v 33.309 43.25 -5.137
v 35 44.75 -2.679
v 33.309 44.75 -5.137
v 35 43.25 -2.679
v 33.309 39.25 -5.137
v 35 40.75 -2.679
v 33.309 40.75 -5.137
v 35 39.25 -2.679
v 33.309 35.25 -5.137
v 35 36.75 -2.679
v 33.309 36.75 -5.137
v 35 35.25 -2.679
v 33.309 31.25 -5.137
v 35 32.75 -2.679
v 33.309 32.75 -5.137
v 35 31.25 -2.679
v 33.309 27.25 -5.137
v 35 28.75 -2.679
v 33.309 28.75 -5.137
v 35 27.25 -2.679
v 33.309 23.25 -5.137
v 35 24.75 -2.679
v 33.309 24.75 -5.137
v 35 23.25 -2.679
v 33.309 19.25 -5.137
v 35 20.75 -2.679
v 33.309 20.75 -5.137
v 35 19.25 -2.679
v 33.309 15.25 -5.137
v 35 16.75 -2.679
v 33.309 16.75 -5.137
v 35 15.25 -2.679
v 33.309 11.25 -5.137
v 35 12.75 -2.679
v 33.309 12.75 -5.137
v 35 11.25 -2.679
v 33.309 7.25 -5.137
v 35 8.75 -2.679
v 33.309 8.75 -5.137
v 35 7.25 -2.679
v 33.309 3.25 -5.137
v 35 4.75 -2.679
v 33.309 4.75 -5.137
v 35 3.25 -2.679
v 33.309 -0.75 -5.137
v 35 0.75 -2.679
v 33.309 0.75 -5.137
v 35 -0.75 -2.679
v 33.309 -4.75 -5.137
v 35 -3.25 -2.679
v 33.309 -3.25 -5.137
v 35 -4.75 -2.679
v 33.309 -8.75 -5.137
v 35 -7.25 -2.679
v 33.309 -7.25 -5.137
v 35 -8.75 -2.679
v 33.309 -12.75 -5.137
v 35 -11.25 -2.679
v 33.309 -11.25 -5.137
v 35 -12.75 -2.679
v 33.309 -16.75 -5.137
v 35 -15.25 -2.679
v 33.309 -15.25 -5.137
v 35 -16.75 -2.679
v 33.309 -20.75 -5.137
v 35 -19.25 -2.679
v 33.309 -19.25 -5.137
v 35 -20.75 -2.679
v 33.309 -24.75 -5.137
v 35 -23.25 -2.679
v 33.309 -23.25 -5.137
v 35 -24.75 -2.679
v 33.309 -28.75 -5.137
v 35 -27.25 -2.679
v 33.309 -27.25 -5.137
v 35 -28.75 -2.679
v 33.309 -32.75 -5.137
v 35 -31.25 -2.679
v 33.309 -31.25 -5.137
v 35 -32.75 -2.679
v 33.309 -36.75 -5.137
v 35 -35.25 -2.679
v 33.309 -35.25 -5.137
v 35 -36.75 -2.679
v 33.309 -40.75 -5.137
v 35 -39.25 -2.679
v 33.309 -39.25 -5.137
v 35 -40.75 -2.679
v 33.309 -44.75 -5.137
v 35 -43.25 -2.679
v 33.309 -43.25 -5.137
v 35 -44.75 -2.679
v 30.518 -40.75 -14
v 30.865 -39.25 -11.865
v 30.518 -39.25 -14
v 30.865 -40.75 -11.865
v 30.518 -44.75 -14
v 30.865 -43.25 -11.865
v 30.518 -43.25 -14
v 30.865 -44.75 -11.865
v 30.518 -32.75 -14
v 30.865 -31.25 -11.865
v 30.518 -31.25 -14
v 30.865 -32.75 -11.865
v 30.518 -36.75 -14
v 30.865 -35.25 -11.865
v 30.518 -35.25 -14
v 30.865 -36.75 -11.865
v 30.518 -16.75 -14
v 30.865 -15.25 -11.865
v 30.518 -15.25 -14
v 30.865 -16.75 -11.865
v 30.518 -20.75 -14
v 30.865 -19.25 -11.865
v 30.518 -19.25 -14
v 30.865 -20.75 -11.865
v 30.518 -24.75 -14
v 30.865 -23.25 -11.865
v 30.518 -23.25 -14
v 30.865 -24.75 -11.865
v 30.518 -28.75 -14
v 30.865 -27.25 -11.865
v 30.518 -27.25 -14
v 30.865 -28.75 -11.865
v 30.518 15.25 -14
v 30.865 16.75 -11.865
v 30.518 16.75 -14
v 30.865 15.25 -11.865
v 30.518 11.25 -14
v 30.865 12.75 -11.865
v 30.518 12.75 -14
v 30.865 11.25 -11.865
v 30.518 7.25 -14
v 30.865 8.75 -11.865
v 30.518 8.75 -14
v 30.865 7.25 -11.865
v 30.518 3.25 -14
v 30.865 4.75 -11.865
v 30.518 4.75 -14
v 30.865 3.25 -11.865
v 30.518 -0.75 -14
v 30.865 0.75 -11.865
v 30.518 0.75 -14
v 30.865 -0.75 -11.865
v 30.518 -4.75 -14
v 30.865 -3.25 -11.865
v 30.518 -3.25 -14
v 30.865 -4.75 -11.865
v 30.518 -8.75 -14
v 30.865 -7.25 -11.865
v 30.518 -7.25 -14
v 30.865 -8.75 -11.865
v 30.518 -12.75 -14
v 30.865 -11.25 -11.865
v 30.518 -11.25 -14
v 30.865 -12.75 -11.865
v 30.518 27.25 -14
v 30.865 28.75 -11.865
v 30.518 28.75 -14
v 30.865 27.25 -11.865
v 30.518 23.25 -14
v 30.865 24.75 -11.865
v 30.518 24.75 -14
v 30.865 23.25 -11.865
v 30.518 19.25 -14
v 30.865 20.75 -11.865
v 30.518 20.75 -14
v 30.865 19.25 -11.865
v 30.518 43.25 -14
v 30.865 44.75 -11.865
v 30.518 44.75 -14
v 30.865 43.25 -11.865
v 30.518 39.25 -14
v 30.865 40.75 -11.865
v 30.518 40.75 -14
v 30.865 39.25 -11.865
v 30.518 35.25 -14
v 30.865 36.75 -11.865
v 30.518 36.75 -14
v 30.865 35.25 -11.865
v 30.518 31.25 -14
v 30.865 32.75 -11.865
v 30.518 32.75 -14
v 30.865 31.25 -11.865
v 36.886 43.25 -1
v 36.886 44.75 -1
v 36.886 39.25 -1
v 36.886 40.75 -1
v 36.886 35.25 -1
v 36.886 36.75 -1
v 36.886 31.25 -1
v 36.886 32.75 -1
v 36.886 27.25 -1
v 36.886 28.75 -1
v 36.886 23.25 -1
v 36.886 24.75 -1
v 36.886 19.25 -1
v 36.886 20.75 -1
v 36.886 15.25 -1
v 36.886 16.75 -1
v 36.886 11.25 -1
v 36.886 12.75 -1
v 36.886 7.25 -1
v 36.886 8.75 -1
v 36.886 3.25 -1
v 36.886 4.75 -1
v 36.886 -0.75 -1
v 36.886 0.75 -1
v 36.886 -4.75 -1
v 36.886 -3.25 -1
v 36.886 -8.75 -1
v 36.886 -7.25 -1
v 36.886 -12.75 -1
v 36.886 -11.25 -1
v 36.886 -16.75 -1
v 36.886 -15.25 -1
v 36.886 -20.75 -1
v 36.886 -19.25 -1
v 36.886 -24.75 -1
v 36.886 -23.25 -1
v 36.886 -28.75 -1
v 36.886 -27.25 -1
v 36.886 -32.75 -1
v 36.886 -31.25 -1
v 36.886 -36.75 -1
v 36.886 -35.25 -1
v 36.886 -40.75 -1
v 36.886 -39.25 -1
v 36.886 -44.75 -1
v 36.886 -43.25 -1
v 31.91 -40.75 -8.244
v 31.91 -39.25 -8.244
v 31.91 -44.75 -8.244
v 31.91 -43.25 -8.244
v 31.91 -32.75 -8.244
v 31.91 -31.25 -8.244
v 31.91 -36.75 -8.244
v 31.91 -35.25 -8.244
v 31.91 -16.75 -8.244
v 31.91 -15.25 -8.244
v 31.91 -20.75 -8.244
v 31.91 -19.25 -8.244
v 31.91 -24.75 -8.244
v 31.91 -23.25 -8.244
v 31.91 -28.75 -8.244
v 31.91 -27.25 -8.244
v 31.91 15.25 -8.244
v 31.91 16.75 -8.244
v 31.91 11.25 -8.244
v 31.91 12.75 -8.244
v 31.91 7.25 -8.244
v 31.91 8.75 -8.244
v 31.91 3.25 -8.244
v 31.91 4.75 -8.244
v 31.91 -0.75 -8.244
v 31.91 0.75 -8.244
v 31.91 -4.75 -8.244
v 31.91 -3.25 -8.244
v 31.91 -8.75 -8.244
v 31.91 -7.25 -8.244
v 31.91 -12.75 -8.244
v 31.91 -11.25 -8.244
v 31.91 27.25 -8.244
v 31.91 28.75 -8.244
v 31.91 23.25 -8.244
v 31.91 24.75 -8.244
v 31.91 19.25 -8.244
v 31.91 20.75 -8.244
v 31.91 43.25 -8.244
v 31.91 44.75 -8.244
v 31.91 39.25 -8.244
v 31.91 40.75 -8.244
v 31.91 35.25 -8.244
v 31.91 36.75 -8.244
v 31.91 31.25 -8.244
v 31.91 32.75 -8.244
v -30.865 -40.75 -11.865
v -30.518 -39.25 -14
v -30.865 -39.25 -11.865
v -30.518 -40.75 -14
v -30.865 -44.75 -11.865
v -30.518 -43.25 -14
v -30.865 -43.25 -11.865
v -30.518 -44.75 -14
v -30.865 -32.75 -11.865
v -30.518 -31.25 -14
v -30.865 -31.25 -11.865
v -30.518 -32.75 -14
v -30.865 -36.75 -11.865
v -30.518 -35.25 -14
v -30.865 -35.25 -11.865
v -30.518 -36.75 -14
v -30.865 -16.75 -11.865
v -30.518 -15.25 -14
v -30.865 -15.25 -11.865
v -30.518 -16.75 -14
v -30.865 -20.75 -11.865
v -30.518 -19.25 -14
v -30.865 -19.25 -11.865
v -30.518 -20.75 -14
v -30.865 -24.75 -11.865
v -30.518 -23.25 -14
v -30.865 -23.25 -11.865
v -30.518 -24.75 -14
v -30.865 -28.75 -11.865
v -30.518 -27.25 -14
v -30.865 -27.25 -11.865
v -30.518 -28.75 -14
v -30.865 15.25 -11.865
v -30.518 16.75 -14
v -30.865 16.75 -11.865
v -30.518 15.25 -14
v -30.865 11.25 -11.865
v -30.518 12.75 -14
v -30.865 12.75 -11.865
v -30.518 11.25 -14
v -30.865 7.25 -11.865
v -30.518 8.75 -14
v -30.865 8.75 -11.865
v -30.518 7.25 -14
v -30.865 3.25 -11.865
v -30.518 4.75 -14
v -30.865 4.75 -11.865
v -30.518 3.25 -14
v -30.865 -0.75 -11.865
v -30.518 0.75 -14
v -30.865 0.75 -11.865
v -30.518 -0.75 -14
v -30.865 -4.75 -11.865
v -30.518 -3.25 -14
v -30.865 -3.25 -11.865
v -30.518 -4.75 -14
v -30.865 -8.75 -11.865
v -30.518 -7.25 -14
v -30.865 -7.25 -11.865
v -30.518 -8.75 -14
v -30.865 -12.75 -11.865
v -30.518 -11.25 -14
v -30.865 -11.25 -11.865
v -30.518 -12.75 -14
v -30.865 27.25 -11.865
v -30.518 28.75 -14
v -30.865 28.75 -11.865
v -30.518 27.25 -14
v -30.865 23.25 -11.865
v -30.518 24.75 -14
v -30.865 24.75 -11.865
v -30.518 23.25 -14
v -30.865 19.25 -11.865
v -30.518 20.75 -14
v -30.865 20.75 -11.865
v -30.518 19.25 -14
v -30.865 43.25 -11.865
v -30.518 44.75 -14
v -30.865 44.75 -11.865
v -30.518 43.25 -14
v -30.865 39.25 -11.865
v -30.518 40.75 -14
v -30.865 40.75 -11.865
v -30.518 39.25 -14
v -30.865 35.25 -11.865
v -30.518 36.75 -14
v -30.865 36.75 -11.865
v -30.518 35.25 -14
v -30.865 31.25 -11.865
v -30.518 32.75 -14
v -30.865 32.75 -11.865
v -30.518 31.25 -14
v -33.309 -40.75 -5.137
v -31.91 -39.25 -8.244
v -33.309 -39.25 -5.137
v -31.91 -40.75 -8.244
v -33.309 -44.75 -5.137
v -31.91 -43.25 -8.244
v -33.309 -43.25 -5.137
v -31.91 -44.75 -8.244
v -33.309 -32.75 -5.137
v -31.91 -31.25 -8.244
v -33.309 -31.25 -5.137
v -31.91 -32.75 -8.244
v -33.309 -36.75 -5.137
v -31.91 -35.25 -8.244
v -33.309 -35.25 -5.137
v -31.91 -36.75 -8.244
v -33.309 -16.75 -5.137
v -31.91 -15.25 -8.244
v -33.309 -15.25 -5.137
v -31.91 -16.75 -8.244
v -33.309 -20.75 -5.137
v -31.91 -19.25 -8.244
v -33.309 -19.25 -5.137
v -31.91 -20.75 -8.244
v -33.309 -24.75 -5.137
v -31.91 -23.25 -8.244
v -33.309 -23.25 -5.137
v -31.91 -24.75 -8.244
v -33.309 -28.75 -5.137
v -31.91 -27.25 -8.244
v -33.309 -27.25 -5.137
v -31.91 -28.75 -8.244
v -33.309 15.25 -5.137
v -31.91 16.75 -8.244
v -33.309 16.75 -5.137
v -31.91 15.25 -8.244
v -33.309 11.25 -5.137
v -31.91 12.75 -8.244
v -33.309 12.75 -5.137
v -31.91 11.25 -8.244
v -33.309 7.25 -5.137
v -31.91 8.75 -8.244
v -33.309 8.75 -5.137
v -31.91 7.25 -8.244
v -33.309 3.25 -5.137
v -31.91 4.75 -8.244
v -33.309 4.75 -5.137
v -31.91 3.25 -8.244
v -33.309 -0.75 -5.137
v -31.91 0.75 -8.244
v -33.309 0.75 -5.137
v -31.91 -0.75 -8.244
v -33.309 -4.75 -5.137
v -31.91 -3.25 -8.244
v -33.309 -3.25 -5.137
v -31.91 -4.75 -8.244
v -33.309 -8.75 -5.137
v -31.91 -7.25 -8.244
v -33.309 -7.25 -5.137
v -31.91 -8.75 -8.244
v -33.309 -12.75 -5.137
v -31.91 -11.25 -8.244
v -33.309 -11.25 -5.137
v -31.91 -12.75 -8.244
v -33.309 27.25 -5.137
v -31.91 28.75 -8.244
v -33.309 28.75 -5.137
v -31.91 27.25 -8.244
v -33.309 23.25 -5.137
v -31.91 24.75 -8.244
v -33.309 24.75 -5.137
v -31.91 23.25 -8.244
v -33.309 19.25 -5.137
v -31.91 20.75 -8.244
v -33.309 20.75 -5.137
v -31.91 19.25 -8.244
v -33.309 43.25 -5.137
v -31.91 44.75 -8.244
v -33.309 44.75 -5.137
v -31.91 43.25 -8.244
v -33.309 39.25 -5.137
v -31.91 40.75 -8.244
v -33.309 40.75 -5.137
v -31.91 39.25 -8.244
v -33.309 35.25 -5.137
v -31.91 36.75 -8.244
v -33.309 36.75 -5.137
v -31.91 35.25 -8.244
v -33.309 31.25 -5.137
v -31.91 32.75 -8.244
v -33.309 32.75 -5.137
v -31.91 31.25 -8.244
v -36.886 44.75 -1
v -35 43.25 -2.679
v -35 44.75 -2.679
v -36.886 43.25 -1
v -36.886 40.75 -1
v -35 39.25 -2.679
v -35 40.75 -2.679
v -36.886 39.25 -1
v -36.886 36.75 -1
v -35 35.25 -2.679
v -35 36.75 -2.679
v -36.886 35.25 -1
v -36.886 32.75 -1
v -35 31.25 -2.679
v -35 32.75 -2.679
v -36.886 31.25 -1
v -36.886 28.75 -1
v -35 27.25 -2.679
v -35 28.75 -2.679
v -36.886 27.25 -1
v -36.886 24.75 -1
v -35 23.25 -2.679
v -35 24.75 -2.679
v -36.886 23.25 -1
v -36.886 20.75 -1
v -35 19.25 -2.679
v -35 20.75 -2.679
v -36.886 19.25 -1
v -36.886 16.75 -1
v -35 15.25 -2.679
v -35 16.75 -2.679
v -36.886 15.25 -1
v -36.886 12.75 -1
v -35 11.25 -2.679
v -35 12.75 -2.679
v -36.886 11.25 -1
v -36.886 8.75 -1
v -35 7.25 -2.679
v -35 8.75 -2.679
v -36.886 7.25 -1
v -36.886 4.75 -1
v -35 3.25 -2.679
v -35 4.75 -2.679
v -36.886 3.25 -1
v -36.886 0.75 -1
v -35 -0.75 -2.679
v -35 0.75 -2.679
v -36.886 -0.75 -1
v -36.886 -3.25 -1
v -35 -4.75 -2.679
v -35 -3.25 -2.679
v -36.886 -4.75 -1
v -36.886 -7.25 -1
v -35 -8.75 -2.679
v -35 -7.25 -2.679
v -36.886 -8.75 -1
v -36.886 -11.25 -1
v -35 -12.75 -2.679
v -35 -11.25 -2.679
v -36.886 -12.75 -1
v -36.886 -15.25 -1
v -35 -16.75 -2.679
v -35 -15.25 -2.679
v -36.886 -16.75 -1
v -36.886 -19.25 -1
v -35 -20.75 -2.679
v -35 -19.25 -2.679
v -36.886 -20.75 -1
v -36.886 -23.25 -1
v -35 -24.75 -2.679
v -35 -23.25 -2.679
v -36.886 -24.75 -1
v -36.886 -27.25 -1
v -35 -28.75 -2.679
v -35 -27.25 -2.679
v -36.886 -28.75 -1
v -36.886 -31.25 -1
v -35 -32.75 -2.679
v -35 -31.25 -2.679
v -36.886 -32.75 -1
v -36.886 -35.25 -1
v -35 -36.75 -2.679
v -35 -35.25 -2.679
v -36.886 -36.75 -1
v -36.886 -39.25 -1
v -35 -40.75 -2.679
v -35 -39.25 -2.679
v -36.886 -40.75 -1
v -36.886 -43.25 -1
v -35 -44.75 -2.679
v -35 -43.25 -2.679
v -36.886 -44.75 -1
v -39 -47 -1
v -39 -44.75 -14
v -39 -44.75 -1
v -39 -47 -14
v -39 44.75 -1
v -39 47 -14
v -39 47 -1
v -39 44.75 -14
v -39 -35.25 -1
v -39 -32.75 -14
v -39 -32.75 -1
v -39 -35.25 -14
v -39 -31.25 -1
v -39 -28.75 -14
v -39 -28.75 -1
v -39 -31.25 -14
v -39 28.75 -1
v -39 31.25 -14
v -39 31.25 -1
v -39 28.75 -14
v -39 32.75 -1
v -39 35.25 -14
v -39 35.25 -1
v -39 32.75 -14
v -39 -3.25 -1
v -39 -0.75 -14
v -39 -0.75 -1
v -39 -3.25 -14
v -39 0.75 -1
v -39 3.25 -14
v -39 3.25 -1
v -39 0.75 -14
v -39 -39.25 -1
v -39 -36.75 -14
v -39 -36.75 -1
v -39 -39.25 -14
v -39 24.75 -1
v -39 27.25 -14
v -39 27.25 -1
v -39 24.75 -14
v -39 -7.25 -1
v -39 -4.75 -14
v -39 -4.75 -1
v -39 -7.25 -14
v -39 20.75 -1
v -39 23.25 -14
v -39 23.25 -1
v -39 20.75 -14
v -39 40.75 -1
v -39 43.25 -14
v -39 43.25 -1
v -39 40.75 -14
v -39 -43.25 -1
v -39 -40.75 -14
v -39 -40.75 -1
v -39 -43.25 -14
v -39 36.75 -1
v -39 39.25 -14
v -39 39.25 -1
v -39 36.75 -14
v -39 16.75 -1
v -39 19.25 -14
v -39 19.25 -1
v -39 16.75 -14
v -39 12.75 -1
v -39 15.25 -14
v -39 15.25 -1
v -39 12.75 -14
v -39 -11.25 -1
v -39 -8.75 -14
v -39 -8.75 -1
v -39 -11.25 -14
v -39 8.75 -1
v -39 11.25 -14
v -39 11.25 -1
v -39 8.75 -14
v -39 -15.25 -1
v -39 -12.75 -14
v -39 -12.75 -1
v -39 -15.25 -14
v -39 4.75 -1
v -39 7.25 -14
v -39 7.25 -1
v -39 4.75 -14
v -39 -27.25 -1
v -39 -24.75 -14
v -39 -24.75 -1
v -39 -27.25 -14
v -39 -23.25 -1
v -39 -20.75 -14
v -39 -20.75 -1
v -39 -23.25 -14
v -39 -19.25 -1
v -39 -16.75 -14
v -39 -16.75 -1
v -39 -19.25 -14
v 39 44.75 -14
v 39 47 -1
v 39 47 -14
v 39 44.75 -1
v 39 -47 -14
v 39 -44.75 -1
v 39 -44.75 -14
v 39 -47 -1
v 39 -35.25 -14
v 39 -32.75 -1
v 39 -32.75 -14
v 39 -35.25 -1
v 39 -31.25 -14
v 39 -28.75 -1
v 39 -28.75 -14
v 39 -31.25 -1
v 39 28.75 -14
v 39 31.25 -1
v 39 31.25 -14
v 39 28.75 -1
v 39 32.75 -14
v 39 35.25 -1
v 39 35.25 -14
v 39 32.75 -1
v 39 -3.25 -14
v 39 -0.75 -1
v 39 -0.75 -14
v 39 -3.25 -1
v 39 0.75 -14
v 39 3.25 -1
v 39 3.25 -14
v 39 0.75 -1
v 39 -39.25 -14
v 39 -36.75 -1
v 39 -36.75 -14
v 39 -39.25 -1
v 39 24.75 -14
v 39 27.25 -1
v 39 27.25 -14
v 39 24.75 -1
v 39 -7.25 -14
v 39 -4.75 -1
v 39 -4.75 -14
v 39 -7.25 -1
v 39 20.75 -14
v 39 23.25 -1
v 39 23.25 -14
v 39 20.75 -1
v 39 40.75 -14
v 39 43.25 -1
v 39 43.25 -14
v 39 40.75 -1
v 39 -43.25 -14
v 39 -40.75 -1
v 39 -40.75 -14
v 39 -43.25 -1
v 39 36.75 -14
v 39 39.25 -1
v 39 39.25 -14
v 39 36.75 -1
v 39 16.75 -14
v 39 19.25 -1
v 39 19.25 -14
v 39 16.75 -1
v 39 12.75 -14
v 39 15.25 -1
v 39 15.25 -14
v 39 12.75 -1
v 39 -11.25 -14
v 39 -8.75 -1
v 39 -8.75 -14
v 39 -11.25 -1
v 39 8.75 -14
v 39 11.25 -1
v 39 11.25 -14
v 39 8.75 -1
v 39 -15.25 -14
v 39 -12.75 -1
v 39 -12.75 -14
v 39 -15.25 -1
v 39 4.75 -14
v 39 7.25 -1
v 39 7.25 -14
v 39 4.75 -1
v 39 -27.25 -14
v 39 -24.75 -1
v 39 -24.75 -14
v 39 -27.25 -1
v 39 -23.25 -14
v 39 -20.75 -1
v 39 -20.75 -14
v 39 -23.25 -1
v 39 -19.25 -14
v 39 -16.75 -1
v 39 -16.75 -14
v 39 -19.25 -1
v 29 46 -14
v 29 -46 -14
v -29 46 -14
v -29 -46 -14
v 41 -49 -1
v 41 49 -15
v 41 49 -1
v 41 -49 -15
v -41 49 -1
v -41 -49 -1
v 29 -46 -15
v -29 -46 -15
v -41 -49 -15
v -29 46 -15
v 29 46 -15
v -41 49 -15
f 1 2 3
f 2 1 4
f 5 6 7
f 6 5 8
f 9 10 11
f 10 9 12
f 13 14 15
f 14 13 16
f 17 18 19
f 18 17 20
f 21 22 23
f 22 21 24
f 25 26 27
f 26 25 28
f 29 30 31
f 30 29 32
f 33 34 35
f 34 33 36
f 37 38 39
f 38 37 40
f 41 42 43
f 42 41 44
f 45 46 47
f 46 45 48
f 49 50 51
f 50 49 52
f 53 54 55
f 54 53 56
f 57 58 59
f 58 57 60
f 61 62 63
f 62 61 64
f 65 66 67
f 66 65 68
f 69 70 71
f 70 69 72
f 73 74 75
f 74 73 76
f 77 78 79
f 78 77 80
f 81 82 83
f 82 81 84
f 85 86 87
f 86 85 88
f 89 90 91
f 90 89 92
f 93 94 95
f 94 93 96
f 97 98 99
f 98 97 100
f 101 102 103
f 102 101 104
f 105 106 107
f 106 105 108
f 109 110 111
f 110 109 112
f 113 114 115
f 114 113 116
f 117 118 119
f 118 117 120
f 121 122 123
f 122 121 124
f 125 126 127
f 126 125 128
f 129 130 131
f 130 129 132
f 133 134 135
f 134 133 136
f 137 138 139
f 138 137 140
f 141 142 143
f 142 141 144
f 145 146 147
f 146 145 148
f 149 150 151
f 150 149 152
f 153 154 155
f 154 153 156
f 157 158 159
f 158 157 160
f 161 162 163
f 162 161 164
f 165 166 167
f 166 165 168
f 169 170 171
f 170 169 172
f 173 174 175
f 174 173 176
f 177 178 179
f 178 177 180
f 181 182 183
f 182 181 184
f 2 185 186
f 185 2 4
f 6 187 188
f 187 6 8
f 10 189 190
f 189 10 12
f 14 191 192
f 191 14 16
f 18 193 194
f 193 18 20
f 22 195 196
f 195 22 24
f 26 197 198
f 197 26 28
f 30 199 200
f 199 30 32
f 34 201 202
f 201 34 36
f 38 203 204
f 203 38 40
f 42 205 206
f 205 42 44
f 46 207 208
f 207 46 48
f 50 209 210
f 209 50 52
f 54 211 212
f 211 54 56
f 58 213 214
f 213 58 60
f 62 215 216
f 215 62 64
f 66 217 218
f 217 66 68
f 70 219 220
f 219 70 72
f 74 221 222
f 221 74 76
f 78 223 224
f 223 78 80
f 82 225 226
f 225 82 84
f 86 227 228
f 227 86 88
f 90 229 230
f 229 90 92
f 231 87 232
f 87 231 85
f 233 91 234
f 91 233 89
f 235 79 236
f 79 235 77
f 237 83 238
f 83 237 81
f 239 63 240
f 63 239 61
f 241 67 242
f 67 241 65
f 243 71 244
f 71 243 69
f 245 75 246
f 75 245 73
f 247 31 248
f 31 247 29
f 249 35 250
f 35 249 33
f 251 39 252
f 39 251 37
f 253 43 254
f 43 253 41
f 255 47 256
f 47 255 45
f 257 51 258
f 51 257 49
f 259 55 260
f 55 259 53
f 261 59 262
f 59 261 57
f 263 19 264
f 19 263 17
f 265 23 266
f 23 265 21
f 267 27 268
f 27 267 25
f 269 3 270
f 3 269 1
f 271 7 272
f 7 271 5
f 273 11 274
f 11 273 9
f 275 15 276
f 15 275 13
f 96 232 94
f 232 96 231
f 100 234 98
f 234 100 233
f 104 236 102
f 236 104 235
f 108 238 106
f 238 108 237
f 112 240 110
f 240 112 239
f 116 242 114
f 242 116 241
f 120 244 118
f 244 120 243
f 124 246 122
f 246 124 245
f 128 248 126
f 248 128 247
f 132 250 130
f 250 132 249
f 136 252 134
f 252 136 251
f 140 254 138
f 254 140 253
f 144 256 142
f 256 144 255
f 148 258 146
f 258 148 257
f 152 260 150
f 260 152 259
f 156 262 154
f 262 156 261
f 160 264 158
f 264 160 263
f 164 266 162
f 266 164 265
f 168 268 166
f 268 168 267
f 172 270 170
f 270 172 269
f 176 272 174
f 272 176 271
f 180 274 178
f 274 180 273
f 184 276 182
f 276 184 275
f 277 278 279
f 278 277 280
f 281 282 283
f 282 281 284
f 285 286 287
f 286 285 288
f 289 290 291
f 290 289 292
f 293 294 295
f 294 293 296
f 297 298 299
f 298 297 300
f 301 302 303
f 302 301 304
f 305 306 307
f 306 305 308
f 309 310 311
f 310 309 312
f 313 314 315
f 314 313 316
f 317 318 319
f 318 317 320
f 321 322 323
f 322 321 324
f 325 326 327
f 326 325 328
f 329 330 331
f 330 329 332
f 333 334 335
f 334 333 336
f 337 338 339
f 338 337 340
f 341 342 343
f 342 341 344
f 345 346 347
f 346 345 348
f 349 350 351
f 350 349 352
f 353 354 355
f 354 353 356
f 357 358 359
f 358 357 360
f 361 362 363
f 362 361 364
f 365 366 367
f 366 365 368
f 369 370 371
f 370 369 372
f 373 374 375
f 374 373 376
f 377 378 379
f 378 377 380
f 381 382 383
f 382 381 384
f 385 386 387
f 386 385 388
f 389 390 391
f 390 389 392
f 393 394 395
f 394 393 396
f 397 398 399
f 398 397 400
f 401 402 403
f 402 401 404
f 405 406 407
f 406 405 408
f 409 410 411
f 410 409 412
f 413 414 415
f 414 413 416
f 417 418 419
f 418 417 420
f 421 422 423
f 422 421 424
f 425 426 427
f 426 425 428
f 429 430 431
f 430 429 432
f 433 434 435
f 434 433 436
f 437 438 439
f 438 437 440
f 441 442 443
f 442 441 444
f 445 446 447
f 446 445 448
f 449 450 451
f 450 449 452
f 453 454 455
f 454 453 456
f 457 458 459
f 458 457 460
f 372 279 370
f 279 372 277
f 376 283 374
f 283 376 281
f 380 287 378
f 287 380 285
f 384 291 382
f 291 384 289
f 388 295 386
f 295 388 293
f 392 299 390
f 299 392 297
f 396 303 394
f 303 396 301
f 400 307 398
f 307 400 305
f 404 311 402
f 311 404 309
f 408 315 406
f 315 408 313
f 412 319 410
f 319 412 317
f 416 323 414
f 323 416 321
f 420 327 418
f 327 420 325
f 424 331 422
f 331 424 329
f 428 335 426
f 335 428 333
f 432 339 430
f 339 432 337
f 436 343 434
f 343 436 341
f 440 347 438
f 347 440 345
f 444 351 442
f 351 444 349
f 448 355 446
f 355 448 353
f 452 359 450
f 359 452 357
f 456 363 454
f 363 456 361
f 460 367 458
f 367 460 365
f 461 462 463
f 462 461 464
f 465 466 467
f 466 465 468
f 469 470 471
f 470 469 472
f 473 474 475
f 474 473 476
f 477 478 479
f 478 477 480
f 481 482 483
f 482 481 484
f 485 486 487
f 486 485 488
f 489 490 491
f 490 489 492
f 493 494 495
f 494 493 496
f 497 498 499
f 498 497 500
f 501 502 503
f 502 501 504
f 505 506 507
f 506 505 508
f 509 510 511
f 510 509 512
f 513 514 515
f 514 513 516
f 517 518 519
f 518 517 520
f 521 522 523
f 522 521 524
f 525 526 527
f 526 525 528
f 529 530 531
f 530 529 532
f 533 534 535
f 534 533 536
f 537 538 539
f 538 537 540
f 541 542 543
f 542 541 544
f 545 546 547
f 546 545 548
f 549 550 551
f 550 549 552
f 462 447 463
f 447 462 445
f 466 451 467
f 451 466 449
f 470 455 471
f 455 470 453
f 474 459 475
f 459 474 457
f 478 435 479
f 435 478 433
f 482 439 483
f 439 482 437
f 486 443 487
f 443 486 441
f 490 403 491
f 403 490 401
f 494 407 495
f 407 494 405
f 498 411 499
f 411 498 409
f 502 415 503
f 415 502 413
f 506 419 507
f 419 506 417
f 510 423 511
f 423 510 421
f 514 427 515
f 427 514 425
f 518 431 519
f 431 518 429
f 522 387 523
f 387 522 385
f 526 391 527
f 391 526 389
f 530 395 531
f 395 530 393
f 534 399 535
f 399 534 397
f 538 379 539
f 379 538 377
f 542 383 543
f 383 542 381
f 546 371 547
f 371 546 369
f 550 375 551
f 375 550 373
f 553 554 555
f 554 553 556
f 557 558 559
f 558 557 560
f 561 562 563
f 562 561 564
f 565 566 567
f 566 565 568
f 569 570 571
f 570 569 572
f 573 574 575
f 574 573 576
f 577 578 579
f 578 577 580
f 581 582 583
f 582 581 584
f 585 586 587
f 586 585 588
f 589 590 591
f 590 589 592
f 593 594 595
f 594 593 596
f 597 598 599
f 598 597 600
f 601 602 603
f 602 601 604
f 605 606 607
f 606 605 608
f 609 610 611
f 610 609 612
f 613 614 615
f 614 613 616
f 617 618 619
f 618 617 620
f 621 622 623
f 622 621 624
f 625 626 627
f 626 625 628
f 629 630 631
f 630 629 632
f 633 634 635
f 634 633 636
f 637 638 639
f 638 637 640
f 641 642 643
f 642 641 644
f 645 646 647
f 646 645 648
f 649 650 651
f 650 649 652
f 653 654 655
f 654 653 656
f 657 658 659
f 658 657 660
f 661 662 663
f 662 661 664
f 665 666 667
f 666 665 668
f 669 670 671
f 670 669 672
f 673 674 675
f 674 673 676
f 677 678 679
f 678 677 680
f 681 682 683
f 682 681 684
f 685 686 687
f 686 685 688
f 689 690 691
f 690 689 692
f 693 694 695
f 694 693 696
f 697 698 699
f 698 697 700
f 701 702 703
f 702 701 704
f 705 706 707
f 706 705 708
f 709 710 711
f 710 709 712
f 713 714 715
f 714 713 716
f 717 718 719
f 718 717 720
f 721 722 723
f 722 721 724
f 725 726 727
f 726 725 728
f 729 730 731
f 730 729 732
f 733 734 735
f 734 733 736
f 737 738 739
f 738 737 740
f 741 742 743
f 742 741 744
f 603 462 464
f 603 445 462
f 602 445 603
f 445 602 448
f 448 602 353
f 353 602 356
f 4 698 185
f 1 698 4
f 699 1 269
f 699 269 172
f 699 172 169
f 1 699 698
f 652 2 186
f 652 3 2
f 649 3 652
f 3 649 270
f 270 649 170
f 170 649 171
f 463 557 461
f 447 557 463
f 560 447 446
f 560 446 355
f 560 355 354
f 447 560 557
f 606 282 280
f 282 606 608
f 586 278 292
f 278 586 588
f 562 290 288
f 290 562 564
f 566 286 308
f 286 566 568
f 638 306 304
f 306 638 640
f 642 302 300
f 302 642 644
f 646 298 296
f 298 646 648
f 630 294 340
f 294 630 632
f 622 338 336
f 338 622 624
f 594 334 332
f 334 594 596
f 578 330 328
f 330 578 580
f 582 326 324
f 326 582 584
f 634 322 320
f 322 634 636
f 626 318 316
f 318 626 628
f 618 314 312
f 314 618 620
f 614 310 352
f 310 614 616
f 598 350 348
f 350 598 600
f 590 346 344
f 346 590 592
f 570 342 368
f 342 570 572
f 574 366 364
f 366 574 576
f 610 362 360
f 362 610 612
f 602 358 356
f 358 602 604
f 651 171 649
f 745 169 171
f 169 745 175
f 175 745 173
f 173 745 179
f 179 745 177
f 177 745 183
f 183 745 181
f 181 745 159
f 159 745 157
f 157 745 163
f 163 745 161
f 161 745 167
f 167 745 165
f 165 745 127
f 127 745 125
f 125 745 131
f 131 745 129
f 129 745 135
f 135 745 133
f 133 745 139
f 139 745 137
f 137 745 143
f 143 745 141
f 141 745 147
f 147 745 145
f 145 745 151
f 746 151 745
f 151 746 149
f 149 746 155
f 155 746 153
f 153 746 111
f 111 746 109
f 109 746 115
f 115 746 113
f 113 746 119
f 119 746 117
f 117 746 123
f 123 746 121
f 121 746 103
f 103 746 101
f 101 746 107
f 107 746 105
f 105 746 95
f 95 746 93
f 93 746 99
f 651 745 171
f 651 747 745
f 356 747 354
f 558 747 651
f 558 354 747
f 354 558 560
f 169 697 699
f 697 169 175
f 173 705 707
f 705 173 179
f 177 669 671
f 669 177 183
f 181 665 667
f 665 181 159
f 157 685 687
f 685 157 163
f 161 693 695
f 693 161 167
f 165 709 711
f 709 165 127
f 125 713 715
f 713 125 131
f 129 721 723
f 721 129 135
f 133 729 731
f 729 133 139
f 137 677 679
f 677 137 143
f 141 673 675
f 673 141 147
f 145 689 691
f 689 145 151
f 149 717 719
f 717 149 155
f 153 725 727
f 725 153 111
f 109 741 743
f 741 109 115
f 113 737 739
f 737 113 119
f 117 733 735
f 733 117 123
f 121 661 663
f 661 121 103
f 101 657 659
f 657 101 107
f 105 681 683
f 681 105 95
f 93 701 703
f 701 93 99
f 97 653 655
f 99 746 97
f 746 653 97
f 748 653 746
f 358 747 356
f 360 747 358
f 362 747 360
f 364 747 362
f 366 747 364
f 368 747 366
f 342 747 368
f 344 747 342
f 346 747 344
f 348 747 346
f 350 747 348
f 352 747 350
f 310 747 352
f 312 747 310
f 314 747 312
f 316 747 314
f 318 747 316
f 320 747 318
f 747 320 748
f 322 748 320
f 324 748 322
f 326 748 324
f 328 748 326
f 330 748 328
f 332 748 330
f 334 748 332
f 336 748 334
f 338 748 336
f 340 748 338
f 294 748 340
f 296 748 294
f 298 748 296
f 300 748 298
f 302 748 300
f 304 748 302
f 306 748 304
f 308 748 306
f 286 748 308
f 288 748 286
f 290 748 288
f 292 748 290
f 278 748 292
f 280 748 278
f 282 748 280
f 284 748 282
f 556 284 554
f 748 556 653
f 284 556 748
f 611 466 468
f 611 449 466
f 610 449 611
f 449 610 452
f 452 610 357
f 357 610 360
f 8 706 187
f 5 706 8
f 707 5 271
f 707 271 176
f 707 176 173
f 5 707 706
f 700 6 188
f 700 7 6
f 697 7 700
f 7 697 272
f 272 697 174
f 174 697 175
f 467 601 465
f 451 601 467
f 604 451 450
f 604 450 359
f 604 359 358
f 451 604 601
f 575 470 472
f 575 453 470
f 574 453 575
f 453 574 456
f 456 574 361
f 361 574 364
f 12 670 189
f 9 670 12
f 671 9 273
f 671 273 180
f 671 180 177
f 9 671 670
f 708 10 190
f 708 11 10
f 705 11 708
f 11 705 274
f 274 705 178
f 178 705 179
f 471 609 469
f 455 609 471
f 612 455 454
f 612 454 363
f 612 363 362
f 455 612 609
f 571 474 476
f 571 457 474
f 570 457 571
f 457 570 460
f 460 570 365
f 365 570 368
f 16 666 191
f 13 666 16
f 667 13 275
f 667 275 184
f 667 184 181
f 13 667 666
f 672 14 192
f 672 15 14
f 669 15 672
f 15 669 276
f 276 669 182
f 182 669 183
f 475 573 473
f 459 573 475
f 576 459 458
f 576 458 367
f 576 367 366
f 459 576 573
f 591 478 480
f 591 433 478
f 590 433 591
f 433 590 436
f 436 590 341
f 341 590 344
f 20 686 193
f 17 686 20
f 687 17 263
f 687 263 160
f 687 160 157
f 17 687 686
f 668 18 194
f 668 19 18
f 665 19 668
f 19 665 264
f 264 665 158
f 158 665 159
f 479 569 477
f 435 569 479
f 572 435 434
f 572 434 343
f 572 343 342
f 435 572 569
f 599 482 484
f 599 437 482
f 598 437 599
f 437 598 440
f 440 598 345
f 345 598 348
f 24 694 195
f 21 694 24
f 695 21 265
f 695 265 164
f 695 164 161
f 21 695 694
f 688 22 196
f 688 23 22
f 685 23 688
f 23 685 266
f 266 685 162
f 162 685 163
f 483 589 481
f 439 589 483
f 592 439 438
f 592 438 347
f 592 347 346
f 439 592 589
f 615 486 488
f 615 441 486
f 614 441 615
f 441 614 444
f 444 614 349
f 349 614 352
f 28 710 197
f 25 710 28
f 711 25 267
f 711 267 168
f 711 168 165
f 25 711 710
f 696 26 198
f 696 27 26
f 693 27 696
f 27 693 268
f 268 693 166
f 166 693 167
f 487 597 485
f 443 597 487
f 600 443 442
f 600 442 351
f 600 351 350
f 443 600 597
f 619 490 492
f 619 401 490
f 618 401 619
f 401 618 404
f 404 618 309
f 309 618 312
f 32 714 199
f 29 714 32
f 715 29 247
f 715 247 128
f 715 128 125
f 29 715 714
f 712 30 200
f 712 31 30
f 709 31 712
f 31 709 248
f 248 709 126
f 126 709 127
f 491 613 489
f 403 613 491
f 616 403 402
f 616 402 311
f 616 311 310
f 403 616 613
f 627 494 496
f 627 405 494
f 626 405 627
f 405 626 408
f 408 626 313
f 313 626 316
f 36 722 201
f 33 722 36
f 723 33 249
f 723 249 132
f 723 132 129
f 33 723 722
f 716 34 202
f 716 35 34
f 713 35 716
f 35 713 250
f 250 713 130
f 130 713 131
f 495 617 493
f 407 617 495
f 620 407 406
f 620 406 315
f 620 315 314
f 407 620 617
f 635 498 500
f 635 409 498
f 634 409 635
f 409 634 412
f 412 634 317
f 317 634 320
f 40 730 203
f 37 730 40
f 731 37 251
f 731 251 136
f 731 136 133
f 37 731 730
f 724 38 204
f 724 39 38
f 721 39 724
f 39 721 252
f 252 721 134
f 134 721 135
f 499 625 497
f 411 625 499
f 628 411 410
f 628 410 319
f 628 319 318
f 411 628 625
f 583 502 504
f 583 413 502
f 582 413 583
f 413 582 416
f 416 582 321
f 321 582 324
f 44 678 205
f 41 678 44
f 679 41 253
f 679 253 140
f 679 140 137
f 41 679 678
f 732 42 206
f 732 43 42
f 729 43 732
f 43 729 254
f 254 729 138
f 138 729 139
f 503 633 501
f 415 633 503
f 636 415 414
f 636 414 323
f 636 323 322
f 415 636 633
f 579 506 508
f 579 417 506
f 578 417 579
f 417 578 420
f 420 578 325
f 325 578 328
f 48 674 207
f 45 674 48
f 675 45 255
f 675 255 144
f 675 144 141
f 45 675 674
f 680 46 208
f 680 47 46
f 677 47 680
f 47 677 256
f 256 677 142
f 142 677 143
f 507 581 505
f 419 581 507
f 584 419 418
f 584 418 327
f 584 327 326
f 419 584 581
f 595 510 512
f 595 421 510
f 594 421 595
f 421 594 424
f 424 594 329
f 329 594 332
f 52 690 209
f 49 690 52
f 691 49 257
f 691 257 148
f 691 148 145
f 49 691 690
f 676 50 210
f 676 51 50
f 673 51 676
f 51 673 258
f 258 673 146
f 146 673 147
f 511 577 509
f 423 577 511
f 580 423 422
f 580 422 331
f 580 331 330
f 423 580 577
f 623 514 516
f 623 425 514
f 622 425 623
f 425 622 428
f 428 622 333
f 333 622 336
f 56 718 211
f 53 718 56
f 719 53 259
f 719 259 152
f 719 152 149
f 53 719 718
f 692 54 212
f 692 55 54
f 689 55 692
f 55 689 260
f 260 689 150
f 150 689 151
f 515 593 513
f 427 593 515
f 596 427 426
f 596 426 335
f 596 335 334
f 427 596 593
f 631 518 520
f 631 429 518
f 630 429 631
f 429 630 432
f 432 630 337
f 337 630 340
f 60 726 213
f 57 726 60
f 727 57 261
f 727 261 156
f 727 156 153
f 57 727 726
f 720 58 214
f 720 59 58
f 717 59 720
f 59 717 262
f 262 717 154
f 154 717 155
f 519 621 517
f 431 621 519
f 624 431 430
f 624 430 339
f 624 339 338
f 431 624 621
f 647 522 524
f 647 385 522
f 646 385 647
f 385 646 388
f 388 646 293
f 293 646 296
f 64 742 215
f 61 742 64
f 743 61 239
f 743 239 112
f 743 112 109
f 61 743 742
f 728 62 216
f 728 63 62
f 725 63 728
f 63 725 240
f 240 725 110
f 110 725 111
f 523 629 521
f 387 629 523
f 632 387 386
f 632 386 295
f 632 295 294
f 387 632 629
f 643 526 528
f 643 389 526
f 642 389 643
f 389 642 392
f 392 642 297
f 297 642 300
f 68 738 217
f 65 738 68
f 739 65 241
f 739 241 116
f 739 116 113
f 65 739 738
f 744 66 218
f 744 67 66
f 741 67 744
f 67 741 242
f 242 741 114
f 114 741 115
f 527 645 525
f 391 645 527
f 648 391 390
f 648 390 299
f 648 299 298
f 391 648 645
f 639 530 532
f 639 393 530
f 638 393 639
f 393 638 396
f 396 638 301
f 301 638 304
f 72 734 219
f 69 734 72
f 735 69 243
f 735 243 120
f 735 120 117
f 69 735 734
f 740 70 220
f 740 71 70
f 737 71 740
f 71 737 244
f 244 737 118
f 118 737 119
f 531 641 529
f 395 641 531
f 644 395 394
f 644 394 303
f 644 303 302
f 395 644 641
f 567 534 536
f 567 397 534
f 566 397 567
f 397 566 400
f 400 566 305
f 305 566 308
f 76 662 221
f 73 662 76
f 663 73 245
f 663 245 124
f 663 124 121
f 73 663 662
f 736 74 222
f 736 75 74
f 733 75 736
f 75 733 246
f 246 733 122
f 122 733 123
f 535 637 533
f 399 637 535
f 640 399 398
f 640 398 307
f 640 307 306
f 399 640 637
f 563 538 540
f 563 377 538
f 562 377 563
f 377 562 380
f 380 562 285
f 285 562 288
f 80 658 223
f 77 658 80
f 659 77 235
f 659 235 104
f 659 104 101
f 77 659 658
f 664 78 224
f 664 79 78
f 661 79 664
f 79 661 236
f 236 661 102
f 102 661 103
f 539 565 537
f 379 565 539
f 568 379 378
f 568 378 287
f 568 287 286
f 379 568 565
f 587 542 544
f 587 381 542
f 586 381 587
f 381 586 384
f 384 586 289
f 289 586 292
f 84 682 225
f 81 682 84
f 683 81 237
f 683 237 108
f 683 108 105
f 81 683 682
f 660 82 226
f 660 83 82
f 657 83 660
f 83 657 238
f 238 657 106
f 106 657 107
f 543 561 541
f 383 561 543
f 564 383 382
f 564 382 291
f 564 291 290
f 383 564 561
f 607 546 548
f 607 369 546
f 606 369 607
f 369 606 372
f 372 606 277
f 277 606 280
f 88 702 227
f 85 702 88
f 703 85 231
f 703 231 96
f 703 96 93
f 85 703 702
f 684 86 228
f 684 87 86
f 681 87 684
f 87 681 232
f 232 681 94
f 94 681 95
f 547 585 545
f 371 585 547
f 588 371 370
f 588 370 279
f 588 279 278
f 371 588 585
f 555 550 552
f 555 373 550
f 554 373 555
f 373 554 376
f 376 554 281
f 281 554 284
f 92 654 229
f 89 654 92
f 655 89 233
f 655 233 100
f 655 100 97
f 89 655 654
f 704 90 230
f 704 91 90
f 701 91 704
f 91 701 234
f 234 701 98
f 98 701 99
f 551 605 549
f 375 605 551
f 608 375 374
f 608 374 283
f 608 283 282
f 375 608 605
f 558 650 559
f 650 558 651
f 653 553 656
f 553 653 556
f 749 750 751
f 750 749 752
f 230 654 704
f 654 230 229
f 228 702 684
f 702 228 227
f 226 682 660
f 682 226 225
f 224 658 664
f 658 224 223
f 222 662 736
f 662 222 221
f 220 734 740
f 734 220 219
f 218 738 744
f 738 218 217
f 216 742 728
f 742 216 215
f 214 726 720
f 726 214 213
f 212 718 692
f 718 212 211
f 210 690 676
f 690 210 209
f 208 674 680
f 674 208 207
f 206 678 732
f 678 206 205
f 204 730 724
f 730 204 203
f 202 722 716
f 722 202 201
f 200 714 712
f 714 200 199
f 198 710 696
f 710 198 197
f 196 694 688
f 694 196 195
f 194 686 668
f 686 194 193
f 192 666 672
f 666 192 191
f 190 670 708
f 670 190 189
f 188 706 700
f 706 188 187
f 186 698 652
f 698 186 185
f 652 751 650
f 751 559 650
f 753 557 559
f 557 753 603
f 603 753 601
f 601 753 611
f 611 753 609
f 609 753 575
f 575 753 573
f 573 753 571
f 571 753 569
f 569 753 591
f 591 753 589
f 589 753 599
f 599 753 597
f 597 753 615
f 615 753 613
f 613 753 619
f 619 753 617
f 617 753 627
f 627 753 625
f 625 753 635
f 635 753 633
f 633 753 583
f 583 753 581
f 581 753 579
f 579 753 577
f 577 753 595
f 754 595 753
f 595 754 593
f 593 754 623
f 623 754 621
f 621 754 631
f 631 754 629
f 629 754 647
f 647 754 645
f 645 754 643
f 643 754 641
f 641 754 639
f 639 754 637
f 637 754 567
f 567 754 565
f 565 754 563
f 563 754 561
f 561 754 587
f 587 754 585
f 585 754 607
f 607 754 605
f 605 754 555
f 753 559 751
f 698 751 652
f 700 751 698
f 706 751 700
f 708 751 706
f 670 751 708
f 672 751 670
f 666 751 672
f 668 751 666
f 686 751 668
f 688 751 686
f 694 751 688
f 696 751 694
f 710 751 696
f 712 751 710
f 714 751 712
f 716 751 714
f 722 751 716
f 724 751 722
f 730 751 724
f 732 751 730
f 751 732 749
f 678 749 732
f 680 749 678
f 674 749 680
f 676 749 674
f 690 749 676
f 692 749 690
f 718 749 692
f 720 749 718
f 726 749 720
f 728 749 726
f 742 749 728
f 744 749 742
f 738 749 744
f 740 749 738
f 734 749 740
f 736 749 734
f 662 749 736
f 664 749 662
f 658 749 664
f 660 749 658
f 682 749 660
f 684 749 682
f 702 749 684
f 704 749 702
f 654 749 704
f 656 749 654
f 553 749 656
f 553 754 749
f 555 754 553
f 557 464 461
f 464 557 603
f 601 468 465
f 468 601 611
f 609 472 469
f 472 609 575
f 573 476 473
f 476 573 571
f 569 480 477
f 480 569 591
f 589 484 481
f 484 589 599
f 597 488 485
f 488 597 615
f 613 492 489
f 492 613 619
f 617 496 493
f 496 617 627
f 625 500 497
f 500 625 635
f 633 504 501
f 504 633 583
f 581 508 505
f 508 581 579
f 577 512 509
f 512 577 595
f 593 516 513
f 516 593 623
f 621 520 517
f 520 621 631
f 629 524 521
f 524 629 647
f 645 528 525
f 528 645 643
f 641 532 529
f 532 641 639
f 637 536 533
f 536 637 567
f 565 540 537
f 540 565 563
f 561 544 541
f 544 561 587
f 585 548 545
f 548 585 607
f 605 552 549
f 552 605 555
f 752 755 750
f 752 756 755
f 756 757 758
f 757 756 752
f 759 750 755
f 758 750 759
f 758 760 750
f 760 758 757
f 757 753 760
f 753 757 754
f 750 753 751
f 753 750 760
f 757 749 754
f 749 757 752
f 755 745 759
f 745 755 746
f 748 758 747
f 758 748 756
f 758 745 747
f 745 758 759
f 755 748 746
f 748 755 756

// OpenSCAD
slides = 25;

module slide() {
cube([78,28,1.5],center=true);
}

module box() {
difference() {
translate([0,0,-8]) cube([82,slides*4-2,14],center=true);
difference() {
cube([78,slides*4-6,28],center=true);
intersection() {
union() {
translate([40,0,-20]) rotate([90,0,0]) scale([0.5,1,1]) cylinder(h=slides*4+15,r=20,center=true);
translate([-40,0,-20]) rotate([90,0,0]) scale([0.5,1,1]) cylinder(h=slides*4+15,r=20,center=true);
}
for (i = [0:slides-1] ) {
  rotate([90,0,0]) translate([0,0,i*4-slides*2-2]) slide();
}
}

}
translate([0,0,-8]) cube([58,slides*4-8,18],center=true);
}

}

box();
